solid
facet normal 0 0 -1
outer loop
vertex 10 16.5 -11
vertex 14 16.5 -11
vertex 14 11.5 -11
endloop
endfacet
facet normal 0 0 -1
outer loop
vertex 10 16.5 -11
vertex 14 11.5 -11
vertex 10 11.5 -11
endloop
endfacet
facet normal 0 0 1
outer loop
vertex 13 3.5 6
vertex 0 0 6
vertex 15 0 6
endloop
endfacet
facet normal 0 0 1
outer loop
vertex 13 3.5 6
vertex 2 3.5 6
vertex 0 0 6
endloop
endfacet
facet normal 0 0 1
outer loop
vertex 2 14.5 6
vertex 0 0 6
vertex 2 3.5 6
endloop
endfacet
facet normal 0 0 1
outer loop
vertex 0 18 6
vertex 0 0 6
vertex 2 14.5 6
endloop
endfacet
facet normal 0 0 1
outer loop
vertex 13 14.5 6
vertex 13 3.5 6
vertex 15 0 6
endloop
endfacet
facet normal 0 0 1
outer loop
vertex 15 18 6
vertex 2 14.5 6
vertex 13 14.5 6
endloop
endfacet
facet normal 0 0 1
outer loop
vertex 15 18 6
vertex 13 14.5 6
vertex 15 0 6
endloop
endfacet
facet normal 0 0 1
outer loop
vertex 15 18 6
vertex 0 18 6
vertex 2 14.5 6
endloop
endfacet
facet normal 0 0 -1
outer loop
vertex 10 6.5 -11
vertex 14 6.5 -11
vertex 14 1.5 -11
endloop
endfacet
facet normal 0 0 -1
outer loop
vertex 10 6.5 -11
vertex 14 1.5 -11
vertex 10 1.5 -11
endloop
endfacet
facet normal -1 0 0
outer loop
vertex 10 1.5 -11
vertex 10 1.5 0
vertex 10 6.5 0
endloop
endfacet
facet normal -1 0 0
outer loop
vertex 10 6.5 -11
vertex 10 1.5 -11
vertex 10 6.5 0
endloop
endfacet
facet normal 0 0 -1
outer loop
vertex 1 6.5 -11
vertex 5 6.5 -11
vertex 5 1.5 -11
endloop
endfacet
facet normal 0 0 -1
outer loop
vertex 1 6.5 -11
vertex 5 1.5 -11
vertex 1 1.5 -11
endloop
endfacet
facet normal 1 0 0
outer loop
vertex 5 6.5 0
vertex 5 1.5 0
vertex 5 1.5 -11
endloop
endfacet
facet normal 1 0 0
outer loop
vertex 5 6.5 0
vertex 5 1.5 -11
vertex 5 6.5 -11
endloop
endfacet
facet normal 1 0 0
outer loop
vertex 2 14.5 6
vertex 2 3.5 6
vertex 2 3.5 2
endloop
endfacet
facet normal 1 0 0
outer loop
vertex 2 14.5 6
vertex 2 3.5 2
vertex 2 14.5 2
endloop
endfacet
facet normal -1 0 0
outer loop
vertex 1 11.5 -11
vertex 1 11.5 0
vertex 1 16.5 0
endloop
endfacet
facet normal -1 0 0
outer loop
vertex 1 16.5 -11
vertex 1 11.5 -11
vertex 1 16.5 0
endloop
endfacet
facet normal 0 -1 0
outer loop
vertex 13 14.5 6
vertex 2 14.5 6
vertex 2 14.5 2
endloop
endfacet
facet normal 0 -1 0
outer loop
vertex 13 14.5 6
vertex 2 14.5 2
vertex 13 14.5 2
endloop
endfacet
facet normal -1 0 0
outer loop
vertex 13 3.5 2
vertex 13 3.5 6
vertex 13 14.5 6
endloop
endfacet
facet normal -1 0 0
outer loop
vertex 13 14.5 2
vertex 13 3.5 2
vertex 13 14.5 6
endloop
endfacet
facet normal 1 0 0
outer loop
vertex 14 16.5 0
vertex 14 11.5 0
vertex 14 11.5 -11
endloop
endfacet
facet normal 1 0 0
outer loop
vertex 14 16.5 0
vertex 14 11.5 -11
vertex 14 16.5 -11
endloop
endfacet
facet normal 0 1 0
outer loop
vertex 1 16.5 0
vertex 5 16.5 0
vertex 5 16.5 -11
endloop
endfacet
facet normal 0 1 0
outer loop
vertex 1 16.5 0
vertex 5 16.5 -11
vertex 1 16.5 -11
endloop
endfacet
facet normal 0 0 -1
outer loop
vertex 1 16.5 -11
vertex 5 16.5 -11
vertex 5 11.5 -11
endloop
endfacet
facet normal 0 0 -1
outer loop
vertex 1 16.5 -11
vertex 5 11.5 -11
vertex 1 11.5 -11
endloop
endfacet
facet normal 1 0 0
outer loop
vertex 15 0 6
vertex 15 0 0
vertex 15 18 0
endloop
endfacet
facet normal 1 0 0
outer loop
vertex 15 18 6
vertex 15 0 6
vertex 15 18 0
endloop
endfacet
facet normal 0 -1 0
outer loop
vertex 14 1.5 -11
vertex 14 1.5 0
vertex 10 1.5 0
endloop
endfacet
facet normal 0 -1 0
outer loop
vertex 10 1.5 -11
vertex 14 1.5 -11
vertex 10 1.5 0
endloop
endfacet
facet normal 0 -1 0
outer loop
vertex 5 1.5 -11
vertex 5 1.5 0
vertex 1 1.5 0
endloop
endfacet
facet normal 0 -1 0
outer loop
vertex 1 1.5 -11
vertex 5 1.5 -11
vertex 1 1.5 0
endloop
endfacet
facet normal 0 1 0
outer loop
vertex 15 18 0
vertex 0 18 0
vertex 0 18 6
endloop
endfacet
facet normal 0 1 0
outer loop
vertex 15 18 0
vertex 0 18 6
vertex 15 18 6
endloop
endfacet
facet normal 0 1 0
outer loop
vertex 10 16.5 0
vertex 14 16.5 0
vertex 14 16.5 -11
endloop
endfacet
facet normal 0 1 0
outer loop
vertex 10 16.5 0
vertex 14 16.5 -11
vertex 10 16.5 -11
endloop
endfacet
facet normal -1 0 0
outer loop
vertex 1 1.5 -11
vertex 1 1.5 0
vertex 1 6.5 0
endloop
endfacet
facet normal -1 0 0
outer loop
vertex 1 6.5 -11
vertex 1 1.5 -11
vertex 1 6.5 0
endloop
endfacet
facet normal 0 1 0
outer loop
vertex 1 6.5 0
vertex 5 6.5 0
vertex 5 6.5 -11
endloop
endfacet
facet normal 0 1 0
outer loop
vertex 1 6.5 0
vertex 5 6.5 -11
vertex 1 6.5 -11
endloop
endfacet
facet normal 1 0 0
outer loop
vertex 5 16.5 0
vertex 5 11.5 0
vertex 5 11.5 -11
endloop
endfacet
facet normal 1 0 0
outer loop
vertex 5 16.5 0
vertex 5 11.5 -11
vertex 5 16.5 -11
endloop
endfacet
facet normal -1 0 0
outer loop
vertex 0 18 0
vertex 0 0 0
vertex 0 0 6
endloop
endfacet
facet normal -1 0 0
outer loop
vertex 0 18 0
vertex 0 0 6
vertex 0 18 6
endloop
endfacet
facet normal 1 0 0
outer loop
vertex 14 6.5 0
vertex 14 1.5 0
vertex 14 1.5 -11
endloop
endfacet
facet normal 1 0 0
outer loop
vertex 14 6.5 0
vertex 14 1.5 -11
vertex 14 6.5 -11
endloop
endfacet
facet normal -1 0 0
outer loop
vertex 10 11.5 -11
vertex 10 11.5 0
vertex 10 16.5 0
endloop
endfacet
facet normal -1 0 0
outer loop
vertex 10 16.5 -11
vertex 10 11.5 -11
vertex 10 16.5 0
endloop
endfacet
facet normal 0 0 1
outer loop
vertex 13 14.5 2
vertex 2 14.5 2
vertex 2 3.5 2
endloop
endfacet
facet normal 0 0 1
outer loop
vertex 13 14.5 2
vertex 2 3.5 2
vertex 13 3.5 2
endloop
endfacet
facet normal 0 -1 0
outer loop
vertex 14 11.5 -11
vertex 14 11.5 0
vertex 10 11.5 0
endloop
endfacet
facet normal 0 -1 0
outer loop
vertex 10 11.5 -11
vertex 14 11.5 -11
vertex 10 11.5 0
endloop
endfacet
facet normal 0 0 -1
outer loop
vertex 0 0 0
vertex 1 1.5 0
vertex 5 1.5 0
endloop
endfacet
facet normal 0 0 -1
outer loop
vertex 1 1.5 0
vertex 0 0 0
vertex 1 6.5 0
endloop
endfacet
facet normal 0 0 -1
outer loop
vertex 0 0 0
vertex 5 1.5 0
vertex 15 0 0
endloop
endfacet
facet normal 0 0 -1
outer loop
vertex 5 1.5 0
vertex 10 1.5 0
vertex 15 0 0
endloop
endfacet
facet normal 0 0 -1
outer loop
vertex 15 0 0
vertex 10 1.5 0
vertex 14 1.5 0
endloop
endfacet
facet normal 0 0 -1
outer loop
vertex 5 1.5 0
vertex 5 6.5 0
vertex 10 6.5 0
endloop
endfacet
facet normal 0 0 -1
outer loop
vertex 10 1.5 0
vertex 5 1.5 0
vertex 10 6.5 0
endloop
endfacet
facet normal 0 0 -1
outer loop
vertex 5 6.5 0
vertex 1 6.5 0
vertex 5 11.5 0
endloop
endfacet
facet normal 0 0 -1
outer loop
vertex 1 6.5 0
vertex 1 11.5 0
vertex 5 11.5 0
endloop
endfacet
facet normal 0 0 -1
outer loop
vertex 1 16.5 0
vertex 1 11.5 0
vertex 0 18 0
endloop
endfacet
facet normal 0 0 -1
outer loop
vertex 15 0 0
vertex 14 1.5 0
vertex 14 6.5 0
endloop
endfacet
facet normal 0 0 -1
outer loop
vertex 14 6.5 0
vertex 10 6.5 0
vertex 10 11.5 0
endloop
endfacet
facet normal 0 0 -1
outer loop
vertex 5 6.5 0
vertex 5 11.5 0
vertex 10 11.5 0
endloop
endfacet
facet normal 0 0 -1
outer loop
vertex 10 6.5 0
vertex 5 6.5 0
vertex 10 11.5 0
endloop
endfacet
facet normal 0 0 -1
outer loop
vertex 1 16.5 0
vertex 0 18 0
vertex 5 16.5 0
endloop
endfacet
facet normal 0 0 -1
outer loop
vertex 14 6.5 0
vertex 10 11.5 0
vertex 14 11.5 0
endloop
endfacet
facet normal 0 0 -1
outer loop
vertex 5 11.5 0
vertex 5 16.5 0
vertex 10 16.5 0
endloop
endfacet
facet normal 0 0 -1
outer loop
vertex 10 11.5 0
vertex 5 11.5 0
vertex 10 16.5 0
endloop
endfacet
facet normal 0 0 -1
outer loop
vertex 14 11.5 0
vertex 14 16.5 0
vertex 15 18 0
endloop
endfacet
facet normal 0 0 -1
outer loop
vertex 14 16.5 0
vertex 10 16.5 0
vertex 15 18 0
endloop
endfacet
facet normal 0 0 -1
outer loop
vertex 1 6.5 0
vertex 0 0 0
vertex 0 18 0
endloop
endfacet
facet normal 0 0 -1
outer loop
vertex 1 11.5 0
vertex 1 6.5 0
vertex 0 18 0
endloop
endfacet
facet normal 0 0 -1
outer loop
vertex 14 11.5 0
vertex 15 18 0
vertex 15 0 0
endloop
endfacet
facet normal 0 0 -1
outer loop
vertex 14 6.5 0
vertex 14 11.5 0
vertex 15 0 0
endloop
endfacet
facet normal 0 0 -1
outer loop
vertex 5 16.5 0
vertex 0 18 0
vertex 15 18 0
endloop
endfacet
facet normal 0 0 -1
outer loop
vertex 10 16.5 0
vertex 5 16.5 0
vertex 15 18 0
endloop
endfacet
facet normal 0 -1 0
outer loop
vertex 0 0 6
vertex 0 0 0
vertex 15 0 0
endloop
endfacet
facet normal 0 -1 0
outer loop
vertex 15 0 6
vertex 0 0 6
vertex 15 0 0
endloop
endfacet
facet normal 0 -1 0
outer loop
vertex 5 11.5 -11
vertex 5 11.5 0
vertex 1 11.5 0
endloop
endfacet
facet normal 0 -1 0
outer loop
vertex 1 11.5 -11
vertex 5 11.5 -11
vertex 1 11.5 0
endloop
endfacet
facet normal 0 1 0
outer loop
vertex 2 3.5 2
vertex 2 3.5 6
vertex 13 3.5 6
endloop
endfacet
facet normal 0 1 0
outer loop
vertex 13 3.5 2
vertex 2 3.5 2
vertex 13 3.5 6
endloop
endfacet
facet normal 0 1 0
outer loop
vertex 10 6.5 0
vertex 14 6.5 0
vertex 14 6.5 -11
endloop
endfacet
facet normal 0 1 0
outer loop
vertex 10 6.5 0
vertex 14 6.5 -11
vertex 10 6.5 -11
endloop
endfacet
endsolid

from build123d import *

# Parameters (mm, degrees)
SKETCH1_W           = 15
SKETCH1_H           = 18
BOSS_EXTRUDE1_DEPTH = 6
SKETCH2_W           = 11
SKETCH2_H           = 11
CUT_EXTRUDE1_DEPTH  = 4
SKETCH3_W           = 4
SKETCH3_H           = 5
BOSS_EXTRUDE2_DEPTH = 11


with BuildPart() as part:
    # Sketch1 → Boss-Extrude1 (new body)
    with BuildSketch(Plane.XY):
        with Locations((7.5, 9)):
            Rectangle(SKETCH1_W, SKETCH1_H)
    extrude(amount=BOSS_EXTRUDE1_DEPTH)

    # Sketch2 → Cut-Extrude1 (cut)
    with BuildSketch(Plane.XY.offset(6)):
        with Locations((7.5, 9)):
            Rectangle(SKETCH2_W, SKETCH2_H)
    extrude(amount=-CUT_EXTRUDE1_DEPTH, mode=Mode.SUBTRACT)

    # Sketch3 → Boss-Extrude2 (add)
    with BuildSketch(Plane(origin=(0, 0, 0), x_dir=(-1, 0, 0), z_dir=(0, 0, -1))):
        with Locations((-12, 14)):
            Rectangle(SKETCH3_W, SKETCH3_H)
        with Locations((-3, 14)):
            Rectangle(SKETCH3_W, SKETCH3_H)
        with Locations((-12, 4)):
            Rectangle(SKETCH3_W, SKETCH3_H)
        with Locations((-3, 4)):
            Rectangle(SKETCH3_W, SKETCH3_H)
    extrude(amount=BOSS_EXTRUDE2_DEPTH)


solid = part.part
